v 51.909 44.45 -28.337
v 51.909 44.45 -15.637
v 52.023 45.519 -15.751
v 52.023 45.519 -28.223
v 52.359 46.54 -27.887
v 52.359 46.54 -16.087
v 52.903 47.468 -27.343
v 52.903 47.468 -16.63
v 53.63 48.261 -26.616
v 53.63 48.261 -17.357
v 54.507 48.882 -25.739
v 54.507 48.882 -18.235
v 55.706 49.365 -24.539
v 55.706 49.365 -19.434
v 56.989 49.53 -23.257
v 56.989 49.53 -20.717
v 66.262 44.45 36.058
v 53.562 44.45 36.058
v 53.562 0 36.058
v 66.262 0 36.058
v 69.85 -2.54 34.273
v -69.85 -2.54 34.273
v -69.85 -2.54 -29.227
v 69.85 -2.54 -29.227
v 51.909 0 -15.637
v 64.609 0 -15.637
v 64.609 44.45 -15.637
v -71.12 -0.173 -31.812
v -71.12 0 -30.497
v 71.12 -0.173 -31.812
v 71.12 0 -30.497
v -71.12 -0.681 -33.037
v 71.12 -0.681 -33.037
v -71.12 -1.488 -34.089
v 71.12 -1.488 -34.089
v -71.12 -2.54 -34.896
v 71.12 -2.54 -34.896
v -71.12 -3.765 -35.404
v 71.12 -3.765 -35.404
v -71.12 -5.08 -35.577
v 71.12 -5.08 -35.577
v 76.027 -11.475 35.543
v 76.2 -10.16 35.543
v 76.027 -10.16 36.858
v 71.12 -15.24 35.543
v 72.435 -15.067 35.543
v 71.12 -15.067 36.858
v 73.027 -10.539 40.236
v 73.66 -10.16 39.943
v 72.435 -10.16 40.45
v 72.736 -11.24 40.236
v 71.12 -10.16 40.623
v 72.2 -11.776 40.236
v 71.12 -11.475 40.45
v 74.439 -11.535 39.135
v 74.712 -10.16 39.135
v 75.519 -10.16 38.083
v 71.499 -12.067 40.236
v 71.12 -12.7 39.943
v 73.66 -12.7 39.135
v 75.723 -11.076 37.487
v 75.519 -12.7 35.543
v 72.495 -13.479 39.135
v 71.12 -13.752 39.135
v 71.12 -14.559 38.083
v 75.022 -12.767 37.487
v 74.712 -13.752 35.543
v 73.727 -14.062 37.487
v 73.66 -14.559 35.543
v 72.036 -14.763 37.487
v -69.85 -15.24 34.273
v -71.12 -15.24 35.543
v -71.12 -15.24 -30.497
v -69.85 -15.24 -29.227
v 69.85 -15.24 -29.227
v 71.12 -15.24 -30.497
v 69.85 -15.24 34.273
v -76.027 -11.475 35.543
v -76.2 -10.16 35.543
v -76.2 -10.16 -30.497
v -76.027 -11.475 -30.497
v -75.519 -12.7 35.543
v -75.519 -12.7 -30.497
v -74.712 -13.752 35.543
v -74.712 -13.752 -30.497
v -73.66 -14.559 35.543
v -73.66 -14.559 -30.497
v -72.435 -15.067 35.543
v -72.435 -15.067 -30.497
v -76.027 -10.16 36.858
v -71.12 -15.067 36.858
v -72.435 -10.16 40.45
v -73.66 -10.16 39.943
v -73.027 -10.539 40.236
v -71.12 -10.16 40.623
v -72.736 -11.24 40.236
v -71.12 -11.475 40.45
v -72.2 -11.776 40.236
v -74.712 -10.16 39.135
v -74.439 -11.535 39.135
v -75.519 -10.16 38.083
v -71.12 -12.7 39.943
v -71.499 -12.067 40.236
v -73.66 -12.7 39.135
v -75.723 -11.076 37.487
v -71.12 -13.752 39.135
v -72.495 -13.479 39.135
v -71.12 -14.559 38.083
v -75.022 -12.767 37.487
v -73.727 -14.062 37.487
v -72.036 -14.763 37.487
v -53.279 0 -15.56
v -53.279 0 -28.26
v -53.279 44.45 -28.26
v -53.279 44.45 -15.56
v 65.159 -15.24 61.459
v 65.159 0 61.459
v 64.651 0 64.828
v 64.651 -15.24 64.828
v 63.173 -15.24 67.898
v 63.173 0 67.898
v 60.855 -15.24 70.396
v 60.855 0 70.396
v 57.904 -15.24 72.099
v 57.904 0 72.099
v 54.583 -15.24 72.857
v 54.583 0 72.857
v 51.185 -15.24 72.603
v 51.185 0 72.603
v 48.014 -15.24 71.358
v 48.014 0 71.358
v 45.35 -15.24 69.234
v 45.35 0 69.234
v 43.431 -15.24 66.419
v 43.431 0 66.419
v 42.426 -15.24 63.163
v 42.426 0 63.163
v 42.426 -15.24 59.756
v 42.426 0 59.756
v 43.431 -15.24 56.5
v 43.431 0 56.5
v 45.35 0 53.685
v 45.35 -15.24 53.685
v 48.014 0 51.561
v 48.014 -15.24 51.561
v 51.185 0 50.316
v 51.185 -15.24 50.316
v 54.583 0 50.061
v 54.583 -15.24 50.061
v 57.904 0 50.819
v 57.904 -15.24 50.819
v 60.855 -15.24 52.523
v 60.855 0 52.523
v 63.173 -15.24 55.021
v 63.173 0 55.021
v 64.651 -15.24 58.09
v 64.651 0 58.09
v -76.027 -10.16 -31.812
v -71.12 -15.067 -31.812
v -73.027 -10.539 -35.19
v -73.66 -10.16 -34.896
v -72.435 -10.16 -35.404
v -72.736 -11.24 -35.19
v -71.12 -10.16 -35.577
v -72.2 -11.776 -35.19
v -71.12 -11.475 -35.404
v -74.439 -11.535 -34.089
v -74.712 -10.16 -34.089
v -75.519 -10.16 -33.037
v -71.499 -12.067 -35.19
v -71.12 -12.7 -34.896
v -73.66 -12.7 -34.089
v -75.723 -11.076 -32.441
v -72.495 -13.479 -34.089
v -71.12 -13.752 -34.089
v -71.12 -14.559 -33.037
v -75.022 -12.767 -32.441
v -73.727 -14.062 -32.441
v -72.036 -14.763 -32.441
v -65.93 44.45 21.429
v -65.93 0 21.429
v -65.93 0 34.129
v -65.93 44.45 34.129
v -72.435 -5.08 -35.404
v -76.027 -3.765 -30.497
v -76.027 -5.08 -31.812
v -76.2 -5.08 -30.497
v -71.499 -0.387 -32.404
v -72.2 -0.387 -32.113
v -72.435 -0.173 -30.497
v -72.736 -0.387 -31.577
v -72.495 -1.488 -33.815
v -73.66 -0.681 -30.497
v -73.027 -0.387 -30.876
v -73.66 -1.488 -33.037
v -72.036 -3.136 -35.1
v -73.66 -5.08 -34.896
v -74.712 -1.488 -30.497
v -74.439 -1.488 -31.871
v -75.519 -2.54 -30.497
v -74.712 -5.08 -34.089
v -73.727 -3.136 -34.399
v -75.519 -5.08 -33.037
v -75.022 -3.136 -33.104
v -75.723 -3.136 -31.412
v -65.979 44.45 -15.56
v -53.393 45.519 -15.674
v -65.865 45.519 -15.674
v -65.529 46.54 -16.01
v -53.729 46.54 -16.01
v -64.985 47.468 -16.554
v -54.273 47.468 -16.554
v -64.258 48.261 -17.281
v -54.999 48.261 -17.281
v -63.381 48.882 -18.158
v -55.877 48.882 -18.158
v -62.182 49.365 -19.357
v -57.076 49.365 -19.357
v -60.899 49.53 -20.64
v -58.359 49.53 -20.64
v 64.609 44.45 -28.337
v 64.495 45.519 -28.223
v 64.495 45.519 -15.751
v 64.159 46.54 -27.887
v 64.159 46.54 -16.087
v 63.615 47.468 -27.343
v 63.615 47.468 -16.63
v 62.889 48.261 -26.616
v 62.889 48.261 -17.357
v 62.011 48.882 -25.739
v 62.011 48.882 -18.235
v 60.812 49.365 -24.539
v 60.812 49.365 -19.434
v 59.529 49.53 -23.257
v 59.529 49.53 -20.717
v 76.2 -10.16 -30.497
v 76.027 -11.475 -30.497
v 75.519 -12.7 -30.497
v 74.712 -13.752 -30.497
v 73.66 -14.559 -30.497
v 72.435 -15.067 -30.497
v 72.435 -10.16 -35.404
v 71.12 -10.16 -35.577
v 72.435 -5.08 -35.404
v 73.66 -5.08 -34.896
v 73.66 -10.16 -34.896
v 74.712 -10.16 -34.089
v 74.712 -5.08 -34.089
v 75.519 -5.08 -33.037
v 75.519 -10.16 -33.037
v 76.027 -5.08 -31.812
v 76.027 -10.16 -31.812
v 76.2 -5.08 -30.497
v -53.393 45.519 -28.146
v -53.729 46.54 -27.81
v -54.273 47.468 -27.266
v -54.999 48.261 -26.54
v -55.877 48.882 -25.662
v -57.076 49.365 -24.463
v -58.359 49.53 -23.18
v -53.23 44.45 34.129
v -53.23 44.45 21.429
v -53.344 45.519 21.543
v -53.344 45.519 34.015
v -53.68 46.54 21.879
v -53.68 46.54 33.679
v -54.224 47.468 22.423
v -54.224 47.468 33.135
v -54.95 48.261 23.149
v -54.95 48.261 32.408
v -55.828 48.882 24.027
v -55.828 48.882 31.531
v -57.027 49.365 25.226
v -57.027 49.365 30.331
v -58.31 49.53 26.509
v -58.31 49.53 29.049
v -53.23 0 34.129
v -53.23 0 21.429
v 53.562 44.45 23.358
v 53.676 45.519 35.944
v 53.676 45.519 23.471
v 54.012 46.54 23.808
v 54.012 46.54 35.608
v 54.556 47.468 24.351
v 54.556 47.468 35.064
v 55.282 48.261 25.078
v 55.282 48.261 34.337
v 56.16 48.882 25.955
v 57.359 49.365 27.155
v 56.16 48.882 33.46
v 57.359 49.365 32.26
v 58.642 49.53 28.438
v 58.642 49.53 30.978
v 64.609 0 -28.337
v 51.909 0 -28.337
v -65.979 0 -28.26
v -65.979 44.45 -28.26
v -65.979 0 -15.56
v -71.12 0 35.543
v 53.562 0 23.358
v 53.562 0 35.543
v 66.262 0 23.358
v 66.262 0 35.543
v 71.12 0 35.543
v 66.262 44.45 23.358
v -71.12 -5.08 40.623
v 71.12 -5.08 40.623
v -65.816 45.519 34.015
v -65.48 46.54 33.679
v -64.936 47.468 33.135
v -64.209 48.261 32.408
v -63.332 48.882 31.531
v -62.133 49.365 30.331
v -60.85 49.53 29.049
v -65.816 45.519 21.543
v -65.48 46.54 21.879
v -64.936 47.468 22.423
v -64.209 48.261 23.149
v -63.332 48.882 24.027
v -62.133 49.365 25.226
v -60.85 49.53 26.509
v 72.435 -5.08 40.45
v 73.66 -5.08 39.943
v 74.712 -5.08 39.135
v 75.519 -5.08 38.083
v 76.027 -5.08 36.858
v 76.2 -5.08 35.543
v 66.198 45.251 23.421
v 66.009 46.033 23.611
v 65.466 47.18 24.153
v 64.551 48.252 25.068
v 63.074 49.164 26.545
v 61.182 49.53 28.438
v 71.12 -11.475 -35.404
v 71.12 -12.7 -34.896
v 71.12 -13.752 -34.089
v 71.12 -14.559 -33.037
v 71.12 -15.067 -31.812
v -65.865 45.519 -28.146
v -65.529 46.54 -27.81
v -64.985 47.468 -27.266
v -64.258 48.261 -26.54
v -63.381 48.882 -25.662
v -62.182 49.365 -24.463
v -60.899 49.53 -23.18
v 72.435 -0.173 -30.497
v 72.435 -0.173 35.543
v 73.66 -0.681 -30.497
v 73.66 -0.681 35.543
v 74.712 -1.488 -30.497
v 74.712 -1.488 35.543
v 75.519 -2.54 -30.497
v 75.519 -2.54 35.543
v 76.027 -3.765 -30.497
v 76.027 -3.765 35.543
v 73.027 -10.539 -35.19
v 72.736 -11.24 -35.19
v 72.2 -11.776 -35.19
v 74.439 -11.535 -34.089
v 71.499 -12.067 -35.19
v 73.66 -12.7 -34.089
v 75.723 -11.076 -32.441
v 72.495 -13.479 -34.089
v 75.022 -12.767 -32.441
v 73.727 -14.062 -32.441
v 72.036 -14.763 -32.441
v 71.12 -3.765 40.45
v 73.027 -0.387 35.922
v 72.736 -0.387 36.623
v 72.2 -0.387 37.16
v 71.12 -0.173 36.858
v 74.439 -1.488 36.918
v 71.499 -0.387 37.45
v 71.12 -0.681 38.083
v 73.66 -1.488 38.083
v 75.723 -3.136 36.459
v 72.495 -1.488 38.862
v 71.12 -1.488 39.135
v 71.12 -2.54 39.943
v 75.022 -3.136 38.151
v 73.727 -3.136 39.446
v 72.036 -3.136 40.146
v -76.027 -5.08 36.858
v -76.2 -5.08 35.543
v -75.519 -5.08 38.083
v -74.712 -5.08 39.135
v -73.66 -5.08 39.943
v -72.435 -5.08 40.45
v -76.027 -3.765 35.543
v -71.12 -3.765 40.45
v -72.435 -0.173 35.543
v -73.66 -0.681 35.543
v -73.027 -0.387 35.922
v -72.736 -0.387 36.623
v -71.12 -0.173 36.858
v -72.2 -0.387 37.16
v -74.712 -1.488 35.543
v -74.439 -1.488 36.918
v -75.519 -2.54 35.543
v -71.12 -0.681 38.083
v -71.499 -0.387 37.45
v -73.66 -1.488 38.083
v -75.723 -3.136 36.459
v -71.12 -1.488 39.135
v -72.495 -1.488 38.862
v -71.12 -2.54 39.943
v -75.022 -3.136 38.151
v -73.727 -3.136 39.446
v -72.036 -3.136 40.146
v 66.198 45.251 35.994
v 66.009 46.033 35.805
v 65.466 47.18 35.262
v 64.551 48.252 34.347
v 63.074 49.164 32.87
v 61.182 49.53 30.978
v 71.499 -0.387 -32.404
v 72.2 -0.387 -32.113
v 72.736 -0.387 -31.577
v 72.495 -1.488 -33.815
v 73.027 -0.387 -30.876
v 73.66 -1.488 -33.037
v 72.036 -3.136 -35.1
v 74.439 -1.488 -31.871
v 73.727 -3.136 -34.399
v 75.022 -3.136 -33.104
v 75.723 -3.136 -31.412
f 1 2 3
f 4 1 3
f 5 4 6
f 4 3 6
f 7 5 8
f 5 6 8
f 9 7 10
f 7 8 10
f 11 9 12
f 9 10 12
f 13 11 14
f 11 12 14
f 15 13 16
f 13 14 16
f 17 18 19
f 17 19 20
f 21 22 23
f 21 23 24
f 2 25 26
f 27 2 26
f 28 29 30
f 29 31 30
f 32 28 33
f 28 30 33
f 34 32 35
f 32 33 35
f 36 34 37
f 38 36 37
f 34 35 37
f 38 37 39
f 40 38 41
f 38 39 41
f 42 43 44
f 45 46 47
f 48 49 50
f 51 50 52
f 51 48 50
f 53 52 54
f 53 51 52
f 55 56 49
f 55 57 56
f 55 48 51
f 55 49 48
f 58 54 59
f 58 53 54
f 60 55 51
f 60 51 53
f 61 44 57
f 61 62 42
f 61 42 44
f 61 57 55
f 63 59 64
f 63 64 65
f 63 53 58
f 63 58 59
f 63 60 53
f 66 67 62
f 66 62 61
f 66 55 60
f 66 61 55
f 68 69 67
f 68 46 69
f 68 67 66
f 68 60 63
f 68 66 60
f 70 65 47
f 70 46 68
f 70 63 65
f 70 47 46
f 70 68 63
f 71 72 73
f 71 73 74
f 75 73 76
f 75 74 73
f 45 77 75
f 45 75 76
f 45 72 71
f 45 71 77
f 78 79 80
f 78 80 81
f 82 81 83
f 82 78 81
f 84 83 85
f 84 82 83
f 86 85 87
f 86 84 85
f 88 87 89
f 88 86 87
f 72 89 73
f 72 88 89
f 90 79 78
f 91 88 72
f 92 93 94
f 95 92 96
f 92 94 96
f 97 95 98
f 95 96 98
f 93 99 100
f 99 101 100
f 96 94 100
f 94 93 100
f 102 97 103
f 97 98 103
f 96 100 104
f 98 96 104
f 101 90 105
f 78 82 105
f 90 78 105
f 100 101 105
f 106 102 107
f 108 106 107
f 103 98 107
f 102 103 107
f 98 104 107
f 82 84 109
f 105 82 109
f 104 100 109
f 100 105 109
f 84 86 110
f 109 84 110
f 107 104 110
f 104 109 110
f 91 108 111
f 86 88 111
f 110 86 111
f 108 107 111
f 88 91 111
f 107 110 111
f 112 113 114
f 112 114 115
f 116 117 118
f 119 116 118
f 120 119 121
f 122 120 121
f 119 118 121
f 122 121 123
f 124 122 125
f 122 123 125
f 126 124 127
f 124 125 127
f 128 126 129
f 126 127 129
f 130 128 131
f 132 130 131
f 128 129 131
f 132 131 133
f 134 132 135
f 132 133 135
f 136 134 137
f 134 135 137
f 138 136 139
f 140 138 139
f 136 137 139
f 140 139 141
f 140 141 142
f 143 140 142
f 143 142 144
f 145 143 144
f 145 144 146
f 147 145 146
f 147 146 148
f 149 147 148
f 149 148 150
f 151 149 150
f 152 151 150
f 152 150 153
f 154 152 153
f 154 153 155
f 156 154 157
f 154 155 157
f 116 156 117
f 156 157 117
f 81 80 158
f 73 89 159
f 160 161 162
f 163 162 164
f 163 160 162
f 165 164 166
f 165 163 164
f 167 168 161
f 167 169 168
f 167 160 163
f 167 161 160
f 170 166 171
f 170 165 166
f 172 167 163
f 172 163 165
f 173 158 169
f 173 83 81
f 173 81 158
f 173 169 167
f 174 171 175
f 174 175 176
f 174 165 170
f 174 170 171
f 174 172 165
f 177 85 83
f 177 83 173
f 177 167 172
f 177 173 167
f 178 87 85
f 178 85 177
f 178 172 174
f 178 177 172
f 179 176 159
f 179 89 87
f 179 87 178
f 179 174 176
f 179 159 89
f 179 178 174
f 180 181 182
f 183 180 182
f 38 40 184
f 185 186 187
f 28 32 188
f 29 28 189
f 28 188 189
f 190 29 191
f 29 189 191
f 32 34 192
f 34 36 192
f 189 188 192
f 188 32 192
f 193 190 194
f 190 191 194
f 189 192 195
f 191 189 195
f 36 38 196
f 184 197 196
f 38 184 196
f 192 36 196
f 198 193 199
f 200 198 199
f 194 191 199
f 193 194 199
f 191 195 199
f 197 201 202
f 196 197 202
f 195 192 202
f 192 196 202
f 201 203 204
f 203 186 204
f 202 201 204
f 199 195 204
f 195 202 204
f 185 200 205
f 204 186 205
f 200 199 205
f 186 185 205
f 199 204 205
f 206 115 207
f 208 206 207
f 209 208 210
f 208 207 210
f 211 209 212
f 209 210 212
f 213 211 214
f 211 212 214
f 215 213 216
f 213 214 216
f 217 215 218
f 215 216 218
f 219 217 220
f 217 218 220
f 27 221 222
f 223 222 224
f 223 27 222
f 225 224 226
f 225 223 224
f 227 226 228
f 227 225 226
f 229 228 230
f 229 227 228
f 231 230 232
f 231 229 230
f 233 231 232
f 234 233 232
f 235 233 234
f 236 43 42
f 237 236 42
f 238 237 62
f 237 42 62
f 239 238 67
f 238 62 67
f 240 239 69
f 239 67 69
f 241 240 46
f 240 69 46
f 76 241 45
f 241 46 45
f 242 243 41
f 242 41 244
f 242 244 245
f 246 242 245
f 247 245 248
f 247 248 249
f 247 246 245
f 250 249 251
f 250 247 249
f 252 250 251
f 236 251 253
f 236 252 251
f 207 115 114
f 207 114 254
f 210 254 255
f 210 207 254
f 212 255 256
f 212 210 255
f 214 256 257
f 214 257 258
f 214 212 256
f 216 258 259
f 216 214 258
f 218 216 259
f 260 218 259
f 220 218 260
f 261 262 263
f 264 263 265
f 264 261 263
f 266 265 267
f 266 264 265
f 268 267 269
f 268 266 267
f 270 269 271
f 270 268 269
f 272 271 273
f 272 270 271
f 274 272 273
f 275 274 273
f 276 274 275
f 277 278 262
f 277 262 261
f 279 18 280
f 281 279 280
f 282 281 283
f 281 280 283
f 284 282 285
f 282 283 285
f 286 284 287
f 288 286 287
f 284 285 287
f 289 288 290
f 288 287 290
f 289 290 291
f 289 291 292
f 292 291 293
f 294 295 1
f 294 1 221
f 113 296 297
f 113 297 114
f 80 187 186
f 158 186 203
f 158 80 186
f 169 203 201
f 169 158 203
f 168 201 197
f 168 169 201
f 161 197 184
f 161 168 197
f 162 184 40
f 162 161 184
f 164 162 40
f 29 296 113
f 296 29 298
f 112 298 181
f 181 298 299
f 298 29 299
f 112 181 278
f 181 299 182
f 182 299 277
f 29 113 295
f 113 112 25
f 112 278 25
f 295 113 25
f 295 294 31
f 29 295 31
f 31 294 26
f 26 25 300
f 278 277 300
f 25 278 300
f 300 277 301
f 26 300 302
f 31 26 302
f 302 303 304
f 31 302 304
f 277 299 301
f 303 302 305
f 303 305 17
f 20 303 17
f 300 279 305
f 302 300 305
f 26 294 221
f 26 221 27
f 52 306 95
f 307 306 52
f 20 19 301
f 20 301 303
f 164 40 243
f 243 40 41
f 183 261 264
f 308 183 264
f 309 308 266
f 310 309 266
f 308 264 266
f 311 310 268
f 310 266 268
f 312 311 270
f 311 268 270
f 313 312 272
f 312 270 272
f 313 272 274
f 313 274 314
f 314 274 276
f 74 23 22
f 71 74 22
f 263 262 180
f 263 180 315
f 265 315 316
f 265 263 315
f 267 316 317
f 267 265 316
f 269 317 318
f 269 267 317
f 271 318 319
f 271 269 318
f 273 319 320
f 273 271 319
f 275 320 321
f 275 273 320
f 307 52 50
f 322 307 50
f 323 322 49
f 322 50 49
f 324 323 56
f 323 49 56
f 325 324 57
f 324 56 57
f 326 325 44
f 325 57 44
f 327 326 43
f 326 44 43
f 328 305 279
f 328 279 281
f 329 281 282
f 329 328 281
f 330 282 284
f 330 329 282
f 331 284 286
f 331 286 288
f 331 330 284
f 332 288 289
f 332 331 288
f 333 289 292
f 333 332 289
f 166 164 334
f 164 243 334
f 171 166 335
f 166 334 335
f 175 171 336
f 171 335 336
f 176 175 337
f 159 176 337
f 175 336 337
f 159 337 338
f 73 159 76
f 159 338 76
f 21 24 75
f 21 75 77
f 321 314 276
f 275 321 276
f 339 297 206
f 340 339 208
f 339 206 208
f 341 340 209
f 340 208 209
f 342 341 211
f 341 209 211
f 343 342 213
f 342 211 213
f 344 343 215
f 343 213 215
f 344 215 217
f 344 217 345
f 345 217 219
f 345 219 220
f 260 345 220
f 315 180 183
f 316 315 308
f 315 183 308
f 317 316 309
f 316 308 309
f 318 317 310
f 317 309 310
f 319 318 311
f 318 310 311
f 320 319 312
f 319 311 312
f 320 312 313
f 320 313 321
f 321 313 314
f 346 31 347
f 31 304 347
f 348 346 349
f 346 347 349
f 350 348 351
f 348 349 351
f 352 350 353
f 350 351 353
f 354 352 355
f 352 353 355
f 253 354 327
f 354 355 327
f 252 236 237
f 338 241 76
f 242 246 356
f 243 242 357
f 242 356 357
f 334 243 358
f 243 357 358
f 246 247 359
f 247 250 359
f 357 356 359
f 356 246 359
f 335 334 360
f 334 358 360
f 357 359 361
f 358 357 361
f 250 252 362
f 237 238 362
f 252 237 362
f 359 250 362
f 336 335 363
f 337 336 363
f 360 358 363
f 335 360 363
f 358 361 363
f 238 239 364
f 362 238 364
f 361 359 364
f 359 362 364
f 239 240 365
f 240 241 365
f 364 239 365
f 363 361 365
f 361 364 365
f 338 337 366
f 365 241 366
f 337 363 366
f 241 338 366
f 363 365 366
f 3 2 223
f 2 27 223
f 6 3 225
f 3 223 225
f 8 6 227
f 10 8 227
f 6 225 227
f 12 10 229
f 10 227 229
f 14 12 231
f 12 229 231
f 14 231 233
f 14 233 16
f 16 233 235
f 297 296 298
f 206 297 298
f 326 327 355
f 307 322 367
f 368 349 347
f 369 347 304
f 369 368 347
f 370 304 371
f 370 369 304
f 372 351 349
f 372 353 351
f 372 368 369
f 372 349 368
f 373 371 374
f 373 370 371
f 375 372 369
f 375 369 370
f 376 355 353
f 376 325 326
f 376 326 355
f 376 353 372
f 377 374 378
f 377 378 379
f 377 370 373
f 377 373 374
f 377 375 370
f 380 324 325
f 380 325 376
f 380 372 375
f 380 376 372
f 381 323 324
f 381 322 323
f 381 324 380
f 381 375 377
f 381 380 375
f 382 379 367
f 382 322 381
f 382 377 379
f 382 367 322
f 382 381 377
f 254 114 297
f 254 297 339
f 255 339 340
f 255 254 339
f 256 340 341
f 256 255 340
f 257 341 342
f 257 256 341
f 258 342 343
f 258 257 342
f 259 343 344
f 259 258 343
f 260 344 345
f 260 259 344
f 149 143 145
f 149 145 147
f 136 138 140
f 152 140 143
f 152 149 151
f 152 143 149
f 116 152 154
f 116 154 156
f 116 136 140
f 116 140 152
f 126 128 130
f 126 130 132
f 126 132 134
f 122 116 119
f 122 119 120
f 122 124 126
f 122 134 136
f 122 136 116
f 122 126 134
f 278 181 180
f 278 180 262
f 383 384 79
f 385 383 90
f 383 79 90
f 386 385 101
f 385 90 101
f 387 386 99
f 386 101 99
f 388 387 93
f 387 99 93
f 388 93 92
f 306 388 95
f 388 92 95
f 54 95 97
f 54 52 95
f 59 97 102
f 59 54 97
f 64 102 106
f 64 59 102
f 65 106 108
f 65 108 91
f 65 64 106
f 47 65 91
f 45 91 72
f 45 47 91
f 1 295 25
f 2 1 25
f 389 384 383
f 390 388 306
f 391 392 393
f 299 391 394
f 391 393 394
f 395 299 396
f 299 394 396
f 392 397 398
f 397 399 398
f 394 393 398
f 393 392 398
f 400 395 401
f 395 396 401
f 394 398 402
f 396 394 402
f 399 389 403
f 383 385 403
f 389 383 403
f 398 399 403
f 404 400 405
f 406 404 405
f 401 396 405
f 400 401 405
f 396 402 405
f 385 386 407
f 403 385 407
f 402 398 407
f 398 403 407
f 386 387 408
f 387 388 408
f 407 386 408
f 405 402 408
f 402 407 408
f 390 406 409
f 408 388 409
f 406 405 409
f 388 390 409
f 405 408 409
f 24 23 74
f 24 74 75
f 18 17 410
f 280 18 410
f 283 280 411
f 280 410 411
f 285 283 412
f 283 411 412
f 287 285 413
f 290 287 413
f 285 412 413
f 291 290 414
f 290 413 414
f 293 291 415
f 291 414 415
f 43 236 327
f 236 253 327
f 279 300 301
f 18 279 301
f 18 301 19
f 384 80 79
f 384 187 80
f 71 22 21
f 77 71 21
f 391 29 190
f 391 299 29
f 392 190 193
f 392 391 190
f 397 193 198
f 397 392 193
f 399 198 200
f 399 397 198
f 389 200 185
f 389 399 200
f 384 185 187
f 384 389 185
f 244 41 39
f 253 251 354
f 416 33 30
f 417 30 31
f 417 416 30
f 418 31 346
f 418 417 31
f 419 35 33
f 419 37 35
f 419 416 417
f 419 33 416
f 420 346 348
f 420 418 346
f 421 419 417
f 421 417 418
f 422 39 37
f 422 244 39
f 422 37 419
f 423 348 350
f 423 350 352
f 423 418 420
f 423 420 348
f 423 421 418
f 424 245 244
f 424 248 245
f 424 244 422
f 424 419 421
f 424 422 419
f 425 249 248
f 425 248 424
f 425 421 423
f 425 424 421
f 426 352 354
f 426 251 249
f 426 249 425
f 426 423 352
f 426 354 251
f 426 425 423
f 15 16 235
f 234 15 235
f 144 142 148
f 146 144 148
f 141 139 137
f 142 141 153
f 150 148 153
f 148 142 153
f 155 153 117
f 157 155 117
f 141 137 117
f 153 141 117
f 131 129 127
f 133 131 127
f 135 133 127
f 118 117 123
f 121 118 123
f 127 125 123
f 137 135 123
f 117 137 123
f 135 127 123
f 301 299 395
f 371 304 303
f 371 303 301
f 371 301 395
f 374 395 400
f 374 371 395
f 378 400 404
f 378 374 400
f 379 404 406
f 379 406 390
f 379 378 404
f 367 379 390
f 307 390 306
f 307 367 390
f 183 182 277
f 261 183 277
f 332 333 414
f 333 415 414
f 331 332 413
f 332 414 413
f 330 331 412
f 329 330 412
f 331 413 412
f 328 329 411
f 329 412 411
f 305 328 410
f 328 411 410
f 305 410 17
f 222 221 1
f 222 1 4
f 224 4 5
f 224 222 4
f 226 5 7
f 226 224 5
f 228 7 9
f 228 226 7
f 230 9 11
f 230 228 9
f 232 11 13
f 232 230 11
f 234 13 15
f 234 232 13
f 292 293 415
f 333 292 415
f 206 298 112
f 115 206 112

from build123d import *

# Parameters (mm, degrees)
F0_W     = 152.4
F0_H     = 76.2
F0_W_2   = 139.7
F0_H_2   = 63.5
F1_DEPTH = 15.24
F0_R     = 11.43
F2_DEPTH = 2.54
F3_R     = 5.08
F4_W     = 12.7
F4_H     = 12.7
F5_DEPTH = 49.53
F6_R     = 5.08


# Not quite as in the source:
# - a feature names something its author has since deleted; it is built from what else it names


with BuildPart() as f1:
    # F0 (on Front) → F1 (new body)
    with BuildSketch(Plane.XZ):
        with Locations((0, 2.523175699)):
            Rectangle(F0_W, F0_H)
        with Locations((0, 2.523175699)):
            Rectangle(F0_W_2, F0_H_2, mode=Mode.SUBTRACT)
    extrude(amount=F1_DEPTH)

    # F0 (on Front) → F2 (join)
    with BuildSketch(Plane.XZ):
        with Locations((0, 2.523175699)):
            Rectangle(F0_W_2, F0_H_2)
    extrude(amount=F2_DEPTH)

    # F3
    f3_edges = [f1.edges().sort_by_distance(p)[0] for p in [
        (-76.2, -15.24, 2.523176),
        (76.2, -15.24, 2.523176),
        (-76.2, -7.62, -35.576824),
        (76.2, -7.62, -35.576824),
        (0, 0, -35.576824),
        (0, -15.24, -35.576824),
        (76.2, -7.62, 40.623176),
        (76.2, 0, 2.523176),
        (-76.2, -7.62, 40.623176),
        (-76.2, 0, 2.523176),
        (0, 0, 40.623176),
        (0, -15.24, 40.623176),
    ]]
    fillet(f3_edges, radius=F3_R)

    # F4 (on Front) → F5 (join)
    with BuildSketch(Plane.XZ):
        with Locations((59.9117761264, 29.707653685)):
            Rectangle(F4_W, F4_H)
        with Locations((58.2590709269, -21.9867194656)):
            Rectangle(F4_W, F4_H)
        with Locations((-59.6288775811, -21.9100740052)):
            Rectangle(F4_W, F4_H)
        with Locations((-59.5799170583, 27.7787972095)):
            Rectangle(F4_W, F4_H)
    extrude(amount=-F5_DEPTH)

    # F6
    f6_edges = [f1.edges().sort_by_distance(p)[0] for p in [
        (58.259071, 49.53, -15.636719),
        (51.909071, 49.53, -21.986719),
        (58.259071, 49.53, -28.336719),
        (64.609071, 49.53, -21.986719),
        (-65.978878, 49.53, -21.910074),
        (-59.628878, 49.53, -28.260074),
        (-53.278878, 49.53, -21.910074),
        (-59.628878, 49.53, -15.560074),
        (66.261776, 49.53, 29.707654),
        (59.911776, 49.53, 36.057654),
        (53.561776, 49.53, 29.707654),
        (59.911776, 49.53, 23.357654),
        (-59.579917, 49.53, 34.128797),
        (-65.929917, 49.53, 27.778797),
        (-59.579917, 49.53, 21.428797),
        (-53.229917, 49.53, 27.778797),
    ]]
    fillet(f6_edges, radius=F6_R)


with BuildPart() as f1b:
    # F0 (on Front) → F1, piece 2 (new body)
    with BuildSketch(Plane.XZ):
        with Locations((53.7286363542, 61.4593066275)):
            Circle(F0_R)
    extrude(amount=F1_DEPTH)


solid = Compound([f1.part, f1b.part])
